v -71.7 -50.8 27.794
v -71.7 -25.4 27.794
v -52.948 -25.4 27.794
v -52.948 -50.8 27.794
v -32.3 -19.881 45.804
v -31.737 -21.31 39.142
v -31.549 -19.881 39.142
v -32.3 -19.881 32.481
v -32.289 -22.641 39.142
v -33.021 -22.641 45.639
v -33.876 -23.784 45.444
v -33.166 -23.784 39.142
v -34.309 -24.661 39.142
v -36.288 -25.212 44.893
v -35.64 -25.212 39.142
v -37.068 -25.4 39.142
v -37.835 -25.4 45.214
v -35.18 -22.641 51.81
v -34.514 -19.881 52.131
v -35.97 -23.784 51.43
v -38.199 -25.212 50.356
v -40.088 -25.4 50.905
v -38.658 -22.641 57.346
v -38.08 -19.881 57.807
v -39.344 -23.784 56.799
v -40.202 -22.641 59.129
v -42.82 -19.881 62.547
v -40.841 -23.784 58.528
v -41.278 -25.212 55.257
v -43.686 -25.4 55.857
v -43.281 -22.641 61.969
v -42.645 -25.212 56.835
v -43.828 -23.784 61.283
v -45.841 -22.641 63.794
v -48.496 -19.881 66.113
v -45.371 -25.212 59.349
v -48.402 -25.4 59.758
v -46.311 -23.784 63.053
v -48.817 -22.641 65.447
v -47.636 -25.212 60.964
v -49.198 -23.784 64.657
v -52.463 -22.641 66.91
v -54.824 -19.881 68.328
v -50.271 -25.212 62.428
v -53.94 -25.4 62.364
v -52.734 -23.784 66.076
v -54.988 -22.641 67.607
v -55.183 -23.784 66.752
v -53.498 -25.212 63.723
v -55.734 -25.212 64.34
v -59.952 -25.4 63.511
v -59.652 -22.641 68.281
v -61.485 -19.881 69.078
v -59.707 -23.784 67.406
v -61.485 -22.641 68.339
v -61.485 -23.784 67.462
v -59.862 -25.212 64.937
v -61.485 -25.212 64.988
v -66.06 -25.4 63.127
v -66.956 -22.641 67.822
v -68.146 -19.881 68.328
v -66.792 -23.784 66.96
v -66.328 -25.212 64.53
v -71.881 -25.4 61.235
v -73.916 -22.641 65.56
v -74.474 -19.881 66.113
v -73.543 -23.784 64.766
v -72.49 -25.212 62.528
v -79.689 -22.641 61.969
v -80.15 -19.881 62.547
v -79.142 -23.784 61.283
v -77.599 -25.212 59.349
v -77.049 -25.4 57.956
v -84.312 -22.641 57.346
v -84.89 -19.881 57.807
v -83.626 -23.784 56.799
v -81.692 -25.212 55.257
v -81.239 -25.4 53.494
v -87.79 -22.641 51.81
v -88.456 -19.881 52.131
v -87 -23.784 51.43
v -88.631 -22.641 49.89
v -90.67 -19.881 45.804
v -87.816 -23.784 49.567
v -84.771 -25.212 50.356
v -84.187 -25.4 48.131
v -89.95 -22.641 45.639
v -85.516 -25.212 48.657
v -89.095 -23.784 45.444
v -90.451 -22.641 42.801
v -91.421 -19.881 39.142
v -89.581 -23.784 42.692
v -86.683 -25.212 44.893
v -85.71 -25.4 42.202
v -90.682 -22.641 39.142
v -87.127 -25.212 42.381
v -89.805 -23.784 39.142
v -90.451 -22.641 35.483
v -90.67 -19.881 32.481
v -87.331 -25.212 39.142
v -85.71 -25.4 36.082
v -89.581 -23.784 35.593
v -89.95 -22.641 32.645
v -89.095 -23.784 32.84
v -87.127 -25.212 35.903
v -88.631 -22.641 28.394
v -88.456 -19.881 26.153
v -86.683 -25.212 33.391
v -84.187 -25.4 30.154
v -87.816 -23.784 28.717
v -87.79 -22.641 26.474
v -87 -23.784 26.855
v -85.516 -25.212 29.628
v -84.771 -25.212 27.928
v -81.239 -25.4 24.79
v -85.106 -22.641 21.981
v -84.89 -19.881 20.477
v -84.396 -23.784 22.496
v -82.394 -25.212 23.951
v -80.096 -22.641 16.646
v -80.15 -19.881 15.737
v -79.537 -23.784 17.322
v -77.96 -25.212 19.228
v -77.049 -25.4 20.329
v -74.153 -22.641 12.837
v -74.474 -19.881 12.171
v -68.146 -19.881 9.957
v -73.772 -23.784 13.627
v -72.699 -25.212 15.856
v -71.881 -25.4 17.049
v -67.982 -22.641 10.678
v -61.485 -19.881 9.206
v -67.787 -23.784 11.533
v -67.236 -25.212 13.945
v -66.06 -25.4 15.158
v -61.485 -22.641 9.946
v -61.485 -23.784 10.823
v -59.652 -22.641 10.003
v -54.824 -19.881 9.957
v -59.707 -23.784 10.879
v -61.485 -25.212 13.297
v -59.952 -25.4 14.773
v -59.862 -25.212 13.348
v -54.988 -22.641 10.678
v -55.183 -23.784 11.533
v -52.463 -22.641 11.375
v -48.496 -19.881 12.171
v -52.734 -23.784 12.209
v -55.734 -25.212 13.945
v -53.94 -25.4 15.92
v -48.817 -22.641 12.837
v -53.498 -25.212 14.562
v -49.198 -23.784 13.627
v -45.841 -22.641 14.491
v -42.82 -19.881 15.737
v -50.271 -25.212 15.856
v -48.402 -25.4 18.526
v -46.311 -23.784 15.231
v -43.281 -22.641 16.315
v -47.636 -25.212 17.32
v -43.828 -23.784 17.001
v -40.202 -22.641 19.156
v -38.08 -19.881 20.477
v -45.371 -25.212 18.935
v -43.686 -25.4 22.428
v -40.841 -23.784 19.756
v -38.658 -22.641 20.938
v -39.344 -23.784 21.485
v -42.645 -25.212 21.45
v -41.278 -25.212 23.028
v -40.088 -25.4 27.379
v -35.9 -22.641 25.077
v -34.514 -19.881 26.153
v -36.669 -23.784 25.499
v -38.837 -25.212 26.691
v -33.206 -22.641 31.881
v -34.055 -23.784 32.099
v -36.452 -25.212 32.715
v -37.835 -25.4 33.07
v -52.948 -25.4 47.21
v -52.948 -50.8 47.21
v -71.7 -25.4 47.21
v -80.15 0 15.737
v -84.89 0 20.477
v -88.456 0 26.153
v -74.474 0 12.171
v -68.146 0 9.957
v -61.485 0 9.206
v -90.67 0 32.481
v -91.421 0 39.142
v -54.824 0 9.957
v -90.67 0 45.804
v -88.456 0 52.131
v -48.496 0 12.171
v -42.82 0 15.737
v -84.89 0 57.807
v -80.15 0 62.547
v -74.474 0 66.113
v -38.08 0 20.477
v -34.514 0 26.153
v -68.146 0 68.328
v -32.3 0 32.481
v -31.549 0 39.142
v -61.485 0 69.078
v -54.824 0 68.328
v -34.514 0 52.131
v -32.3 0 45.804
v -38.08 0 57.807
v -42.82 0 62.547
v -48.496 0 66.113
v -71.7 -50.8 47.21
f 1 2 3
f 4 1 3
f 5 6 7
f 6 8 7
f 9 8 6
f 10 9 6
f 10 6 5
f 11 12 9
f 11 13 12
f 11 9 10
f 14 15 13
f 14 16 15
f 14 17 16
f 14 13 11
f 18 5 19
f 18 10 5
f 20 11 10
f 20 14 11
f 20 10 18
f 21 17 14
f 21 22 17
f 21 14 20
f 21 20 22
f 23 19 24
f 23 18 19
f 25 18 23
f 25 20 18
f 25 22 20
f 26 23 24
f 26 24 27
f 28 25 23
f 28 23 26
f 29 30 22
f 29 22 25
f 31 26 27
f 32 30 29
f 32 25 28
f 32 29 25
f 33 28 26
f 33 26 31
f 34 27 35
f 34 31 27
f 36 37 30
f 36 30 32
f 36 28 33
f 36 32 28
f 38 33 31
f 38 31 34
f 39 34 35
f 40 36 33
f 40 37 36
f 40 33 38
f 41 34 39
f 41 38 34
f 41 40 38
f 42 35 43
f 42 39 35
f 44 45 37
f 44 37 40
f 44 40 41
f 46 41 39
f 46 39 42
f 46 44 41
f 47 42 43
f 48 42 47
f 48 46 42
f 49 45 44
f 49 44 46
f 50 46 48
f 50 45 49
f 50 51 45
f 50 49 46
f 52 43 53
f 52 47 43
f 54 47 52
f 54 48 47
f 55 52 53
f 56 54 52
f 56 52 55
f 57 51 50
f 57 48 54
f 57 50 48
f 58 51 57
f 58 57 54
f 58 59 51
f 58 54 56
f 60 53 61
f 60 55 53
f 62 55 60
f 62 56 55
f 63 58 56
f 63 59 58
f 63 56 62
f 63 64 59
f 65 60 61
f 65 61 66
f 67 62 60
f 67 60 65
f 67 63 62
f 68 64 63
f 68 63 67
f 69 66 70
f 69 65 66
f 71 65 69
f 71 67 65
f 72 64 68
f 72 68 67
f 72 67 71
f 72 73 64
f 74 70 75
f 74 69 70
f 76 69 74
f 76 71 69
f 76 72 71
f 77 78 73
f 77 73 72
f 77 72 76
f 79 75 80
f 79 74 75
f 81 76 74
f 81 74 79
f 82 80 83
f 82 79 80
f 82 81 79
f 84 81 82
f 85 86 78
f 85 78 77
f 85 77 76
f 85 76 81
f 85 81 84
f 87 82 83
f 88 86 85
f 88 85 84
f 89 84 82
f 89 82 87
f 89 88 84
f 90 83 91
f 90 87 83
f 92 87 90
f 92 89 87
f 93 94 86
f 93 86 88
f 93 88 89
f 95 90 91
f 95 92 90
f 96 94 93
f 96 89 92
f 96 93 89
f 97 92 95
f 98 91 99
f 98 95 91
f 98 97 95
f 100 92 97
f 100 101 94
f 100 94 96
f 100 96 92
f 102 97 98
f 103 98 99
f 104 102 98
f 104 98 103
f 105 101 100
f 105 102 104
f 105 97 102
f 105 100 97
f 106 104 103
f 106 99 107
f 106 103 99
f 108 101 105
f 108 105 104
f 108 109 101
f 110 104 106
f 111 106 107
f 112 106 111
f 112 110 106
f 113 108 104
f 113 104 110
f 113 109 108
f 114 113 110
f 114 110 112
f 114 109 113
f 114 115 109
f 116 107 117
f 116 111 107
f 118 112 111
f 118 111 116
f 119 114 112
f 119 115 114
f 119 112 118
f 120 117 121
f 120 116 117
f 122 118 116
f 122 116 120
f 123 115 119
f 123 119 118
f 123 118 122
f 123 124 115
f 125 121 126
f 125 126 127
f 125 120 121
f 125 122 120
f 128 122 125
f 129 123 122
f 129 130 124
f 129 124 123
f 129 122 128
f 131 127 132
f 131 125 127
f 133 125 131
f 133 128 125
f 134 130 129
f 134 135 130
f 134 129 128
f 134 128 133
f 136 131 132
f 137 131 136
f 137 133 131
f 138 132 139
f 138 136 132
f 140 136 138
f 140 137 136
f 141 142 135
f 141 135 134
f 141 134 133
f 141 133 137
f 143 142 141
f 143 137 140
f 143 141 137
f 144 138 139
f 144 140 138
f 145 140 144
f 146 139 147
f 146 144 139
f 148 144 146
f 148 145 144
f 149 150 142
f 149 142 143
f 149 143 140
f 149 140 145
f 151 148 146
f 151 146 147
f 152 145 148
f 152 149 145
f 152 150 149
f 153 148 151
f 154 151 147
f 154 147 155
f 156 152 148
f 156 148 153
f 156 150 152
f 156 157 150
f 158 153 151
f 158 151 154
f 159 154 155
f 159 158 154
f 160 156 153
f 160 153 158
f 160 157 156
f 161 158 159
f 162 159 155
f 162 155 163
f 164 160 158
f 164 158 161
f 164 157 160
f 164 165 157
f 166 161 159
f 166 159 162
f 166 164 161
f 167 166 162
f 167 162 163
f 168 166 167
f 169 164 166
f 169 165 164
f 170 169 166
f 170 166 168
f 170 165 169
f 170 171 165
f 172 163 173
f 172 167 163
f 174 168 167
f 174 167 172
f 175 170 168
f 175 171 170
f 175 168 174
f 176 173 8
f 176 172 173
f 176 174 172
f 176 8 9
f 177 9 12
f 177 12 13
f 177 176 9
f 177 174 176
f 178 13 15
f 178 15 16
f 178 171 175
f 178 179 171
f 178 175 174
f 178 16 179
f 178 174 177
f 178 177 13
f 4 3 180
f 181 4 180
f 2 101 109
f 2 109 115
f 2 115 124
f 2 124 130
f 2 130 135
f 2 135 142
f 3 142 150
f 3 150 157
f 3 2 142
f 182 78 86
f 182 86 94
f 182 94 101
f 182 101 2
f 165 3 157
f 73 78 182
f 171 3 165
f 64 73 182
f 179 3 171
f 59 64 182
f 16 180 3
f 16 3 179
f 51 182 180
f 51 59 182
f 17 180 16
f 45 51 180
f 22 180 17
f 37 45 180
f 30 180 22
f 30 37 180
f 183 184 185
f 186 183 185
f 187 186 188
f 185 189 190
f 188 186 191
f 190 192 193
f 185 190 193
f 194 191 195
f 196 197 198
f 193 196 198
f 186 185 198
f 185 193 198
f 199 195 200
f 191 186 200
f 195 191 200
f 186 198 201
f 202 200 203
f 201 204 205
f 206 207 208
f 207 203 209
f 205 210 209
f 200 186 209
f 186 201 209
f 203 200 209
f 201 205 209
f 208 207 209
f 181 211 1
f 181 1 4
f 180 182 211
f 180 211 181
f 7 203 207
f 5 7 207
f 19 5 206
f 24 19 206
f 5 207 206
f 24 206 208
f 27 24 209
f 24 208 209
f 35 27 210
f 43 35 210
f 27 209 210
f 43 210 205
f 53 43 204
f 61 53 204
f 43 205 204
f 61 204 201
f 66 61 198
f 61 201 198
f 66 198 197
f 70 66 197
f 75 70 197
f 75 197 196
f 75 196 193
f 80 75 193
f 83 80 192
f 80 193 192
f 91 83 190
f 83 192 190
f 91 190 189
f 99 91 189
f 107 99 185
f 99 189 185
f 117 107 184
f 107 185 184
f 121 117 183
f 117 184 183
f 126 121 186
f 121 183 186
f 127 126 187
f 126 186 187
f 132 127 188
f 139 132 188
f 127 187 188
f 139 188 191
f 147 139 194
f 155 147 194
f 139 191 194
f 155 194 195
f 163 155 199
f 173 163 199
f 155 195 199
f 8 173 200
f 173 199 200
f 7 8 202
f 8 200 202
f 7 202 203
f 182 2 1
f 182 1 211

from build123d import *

# Parameters (mm, degrees)
F0_R     = 29.935911
F1_DEPTH = 25.4
F2_R     = 5.518892
F3_W     = 18.751926
F3_H     = 19.416006
F4_DEPTH = 25.4


with BuildPart() as f1:
    # F0 (on Front) → F1 (new body)
    with BuildSketch(Plane.XZ):
        with Locations((-61.485115, 39.142173)):
            Circle(F0_R)
    extrude(amount=F1_DEPTH)

    # F2
    f2_edges = [f1.edges().sort_by_distance(p)[0] for p in [
        (-91.421026, -25.4, 39.142173),
    ]]
    fillet(f2_edges, radius=F2_R)

    # F3 (on face) → F4 (join)
    with BuildSketch(Plane.XZ.offset(25.4)):
        with Locations((-62.324103, 37.501703)):
            Rectangle(F3_W, F3_H)
    extrude(amount=F4_DEPTH)


solid = f1.part
